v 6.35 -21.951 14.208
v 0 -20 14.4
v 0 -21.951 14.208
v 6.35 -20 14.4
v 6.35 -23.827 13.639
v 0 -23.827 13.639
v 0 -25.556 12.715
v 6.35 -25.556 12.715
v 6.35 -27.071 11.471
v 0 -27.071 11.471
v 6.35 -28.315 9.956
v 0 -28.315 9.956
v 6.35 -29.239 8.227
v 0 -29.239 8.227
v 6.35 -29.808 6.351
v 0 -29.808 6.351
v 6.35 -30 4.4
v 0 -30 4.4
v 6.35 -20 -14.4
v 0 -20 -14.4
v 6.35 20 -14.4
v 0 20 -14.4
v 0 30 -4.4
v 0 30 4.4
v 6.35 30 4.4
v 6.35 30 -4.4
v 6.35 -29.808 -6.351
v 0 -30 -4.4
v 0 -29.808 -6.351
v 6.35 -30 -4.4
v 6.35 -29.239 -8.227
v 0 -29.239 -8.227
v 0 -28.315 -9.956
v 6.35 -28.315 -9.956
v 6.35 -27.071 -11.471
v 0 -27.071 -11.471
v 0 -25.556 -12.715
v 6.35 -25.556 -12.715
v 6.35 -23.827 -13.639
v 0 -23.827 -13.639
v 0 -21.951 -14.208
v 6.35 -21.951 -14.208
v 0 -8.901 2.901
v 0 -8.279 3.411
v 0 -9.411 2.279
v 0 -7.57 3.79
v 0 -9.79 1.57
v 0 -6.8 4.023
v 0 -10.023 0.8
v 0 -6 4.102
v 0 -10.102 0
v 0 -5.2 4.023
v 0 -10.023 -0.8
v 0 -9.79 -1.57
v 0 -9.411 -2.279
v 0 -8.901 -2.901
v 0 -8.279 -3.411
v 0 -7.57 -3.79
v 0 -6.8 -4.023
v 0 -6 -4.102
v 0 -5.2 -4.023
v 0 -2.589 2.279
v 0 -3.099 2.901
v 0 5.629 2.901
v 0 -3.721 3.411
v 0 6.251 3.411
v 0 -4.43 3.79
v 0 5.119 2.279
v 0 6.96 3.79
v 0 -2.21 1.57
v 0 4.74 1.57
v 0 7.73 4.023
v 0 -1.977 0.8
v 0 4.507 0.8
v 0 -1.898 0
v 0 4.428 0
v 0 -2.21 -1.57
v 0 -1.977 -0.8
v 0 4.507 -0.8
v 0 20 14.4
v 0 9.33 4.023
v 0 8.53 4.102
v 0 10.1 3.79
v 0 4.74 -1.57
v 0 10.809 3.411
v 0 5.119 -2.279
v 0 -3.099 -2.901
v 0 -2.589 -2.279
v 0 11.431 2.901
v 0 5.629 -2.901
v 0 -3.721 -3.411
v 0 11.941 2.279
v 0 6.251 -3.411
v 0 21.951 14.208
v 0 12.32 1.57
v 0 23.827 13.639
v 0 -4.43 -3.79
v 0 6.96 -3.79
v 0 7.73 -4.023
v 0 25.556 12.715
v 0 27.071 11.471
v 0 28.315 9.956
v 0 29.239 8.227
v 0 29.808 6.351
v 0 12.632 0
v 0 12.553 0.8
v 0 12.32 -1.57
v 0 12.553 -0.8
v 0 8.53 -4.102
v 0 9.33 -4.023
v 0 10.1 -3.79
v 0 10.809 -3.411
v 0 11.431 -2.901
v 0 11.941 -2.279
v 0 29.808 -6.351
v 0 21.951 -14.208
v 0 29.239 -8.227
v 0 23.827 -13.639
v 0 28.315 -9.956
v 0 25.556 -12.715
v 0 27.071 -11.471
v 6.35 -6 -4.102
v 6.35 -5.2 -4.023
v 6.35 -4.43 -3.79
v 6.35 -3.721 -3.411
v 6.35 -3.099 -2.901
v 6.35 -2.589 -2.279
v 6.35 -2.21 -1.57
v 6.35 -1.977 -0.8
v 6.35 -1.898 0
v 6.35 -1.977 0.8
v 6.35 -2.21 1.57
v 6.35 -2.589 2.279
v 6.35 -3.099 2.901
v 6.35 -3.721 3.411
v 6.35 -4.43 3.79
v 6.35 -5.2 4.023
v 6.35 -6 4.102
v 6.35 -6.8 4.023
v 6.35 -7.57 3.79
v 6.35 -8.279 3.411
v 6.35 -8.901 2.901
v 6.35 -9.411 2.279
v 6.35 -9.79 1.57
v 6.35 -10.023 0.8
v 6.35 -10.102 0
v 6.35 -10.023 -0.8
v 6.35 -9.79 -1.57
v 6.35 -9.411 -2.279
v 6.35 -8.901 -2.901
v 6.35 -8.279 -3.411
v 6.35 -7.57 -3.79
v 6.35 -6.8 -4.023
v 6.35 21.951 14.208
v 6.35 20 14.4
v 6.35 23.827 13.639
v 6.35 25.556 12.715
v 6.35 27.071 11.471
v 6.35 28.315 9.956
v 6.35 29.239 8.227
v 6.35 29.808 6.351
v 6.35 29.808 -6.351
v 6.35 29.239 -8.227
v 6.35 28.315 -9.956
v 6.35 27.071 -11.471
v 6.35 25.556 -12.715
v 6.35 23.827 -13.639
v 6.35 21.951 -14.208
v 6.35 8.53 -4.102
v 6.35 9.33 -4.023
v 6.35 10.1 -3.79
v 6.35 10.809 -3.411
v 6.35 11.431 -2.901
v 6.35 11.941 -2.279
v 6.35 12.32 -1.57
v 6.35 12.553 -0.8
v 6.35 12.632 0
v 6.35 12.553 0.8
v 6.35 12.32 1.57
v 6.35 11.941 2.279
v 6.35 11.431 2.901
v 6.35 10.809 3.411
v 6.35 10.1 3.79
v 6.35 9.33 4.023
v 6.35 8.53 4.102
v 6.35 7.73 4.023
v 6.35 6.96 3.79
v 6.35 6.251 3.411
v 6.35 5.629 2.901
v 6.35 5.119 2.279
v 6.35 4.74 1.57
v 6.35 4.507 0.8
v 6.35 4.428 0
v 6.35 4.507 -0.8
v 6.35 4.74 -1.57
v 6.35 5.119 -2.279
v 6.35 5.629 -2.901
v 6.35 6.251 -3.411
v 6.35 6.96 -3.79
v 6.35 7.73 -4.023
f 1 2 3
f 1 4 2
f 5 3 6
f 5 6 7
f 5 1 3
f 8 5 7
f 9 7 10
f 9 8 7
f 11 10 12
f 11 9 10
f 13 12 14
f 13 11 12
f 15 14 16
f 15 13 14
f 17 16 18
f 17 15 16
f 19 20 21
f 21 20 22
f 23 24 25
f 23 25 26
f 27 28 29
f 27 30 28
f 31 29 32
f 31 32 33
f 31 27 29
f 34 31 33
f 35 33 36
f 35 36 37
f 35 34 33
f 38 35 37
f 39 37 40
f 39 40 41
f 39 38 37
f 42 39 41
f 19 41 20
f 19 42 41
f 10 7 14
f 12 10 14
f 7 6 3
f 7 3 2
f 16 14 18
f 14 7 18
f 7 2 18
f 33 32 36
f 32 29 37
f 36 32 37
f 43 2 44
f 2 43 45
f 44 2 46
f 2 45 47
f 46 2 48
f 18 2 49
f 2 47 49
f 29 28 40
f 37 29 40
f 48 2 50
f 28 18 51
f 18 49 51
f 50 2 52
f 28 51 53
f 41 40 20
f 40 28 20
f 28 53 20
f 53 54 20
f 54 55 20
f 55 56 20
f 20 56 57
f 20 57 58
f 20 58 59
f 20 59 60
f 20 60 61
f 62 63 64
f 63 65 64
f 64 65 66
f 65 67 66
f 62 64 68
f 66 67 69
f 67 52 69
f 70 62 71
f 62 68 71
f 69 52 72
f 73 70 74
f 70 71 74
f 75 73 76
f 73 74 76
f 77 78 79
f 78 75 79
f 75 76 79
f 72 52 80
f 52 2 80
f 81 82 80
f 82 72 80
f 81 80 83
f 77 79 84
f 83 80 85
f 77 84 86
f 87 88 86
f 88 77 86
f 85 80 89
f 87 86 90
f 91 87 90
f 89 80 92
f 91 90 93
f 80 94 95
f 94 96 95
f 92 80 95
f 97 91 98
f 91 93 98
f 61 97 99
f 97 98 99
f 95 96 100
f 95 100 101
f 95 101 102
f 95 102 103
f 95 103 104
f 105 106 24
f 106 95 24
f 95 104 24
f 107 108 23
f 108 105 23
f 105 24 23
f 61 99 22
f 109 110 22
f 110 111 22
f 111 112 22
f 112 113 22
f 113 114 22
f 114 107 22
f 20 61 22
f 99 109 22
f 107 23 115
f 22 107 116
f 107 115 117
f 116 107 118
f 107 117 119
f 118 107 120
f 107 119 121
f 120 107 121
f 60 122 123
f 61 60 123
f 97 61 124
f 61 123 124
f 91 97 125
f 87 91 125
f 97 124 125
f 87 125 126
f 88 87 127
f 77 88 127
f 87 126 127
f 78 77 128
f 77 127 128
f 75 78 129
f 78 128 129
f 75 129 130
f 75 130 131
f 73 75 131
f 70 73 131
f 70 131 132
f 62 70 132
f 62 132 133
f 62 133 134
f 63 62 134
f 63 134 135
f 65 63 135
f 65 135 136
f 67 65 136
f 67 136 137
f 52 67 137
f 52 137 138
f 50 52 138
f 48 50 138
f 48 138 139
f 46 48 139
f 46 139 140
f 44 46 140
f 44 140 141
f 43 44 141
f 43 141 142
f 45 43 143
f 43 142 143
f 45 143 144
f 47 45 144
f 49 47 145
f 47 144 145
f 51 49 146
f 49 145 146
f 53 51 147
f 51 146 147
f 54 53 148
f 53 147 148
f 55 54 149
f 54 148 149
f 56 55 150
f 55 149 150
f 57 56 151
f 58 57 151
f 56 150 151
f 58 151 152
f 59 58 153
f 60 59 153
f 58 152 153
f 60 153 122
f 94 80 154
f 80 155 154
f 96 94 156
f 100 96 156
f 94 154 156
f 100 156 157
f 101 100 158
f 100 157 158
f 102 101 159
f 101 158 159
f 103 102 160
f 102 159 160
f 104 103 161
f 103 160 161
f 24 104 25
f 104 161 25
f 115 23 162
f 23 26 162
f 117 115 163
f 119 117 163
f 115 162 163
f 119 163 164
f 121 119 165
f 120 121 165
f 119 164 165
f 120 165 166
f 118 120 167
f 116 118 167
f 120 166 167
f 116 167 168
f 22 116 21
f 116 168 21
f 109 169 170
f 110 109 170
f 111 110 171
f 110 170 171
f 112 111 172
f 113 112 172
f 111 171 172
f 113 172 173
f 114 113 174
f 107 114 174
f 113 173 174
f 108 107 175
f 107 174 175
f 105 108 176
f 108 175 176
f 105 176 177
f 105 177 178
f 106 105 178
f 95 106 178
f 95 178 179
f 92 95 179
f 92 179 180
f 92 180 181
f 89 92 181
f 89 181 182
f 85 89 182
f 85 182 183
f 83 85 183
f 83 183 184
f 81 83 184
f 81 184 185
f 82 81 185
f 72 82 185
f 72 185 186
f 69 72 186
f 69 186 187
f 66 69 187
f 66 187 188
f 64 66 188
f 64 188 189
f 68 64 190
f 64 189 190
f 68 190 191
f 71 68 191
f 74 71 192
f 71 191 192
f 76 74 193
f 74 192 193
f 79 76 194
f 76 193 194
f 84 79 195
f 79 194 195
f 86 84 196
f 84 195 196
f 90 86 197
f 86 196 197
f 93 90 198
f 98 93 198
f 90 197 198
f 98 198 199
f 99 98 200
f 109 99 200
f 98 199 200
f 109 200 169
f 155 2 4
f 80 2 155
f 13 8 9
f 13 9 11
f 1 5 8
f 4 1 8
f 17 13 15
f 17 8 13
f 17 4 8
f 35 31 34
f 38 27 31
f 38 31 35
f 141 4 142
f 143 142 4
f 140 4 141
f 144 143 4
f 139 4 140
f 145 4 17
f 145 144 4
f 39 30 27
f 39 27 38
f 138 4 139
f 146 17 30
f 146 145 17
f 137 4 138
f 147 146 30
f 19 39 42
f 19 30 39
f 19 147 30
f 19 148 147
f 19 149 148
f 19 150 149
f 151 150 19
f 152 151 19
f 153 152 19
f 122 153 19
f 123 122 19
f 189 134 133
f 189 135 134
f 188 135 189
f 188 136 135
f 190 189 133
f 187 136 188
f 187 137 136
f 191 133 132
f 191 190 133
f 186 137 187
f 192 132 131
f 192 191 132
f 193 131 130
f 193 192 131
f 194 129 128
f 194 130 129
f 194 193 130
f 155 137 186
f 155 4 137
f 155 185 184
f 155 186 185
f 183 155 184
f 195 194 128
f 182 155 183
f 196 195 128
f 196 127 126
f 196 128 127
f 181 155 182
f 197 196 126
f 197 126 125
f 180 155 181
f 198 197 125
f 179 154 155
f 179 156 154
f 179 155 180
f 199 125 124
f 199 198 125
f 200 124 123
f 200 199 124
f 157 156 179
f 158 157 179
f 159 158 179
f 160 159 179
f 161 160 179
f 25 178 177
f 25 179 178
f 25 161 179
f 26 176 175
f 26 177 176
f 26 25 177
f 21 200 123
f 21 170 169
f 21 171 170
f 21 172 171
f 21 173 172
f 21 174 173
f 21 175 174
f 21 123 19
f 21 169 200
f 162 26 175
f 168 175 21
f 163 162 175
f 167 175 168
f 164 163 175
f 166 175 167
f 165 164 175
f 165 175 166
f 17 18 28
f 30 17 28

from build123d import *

# Parameters (mm, degrees)
SKETCH1_R                = 4
SKETCH1_W                = 28.8
SKETCH1_H                = 60
BOSS_EXTRUDE1_DEPTH      = 6.35
F_5_16_CLEARANCE_HOLE1_D = 8.2042
FILLET1_R                = 10


with BuildPart() as part:
    # Sketch1 → Boss-Extrude1 (new body)
    with BuildSketch(Plane(origin=(0, 0, 0), x_dir=(0, 0, -1), z_dir=(1, 0, 0))):
        with Locations((0, -6)):
            Circle(SKETCH1_R)
        with Locations((0, 8.53)):
            Circle(SKETCH1_R)
        Rectangle(SKETCH1_W, SKETCH1_H)
        with Locations((0, -6)):
            Circle(SKETCH1_R, mode=Mode.SUBTRACT)
        with Locations((0, 8.53)):
            Circle(SKETCH1_R, mode=Mode.SUBTRACT)
    extrude(amount=BOSS_EXTRUDE1_DEPTH)

    # 5/16 Clearance Hole1 (through all)
    with Locations(Plane.ZY):
        with Locations((0, 8.53), (0, -6)):
            Hole(F_5_16_CLEARANCE_HOLE1_D / 2)

    # Fillet1
    fillet1_edges = [part.edges().sort_by_distance(p)[0] for p in [
        (3.175, 30, 14.4),
        (3.175, 30, -14.4),
        (3.175, -30, -14.4),
        (3.175, -30, 14.4),
    ]]
    fillet(fillet1_edges, radius=FILLET1_R)


solid = part.part
